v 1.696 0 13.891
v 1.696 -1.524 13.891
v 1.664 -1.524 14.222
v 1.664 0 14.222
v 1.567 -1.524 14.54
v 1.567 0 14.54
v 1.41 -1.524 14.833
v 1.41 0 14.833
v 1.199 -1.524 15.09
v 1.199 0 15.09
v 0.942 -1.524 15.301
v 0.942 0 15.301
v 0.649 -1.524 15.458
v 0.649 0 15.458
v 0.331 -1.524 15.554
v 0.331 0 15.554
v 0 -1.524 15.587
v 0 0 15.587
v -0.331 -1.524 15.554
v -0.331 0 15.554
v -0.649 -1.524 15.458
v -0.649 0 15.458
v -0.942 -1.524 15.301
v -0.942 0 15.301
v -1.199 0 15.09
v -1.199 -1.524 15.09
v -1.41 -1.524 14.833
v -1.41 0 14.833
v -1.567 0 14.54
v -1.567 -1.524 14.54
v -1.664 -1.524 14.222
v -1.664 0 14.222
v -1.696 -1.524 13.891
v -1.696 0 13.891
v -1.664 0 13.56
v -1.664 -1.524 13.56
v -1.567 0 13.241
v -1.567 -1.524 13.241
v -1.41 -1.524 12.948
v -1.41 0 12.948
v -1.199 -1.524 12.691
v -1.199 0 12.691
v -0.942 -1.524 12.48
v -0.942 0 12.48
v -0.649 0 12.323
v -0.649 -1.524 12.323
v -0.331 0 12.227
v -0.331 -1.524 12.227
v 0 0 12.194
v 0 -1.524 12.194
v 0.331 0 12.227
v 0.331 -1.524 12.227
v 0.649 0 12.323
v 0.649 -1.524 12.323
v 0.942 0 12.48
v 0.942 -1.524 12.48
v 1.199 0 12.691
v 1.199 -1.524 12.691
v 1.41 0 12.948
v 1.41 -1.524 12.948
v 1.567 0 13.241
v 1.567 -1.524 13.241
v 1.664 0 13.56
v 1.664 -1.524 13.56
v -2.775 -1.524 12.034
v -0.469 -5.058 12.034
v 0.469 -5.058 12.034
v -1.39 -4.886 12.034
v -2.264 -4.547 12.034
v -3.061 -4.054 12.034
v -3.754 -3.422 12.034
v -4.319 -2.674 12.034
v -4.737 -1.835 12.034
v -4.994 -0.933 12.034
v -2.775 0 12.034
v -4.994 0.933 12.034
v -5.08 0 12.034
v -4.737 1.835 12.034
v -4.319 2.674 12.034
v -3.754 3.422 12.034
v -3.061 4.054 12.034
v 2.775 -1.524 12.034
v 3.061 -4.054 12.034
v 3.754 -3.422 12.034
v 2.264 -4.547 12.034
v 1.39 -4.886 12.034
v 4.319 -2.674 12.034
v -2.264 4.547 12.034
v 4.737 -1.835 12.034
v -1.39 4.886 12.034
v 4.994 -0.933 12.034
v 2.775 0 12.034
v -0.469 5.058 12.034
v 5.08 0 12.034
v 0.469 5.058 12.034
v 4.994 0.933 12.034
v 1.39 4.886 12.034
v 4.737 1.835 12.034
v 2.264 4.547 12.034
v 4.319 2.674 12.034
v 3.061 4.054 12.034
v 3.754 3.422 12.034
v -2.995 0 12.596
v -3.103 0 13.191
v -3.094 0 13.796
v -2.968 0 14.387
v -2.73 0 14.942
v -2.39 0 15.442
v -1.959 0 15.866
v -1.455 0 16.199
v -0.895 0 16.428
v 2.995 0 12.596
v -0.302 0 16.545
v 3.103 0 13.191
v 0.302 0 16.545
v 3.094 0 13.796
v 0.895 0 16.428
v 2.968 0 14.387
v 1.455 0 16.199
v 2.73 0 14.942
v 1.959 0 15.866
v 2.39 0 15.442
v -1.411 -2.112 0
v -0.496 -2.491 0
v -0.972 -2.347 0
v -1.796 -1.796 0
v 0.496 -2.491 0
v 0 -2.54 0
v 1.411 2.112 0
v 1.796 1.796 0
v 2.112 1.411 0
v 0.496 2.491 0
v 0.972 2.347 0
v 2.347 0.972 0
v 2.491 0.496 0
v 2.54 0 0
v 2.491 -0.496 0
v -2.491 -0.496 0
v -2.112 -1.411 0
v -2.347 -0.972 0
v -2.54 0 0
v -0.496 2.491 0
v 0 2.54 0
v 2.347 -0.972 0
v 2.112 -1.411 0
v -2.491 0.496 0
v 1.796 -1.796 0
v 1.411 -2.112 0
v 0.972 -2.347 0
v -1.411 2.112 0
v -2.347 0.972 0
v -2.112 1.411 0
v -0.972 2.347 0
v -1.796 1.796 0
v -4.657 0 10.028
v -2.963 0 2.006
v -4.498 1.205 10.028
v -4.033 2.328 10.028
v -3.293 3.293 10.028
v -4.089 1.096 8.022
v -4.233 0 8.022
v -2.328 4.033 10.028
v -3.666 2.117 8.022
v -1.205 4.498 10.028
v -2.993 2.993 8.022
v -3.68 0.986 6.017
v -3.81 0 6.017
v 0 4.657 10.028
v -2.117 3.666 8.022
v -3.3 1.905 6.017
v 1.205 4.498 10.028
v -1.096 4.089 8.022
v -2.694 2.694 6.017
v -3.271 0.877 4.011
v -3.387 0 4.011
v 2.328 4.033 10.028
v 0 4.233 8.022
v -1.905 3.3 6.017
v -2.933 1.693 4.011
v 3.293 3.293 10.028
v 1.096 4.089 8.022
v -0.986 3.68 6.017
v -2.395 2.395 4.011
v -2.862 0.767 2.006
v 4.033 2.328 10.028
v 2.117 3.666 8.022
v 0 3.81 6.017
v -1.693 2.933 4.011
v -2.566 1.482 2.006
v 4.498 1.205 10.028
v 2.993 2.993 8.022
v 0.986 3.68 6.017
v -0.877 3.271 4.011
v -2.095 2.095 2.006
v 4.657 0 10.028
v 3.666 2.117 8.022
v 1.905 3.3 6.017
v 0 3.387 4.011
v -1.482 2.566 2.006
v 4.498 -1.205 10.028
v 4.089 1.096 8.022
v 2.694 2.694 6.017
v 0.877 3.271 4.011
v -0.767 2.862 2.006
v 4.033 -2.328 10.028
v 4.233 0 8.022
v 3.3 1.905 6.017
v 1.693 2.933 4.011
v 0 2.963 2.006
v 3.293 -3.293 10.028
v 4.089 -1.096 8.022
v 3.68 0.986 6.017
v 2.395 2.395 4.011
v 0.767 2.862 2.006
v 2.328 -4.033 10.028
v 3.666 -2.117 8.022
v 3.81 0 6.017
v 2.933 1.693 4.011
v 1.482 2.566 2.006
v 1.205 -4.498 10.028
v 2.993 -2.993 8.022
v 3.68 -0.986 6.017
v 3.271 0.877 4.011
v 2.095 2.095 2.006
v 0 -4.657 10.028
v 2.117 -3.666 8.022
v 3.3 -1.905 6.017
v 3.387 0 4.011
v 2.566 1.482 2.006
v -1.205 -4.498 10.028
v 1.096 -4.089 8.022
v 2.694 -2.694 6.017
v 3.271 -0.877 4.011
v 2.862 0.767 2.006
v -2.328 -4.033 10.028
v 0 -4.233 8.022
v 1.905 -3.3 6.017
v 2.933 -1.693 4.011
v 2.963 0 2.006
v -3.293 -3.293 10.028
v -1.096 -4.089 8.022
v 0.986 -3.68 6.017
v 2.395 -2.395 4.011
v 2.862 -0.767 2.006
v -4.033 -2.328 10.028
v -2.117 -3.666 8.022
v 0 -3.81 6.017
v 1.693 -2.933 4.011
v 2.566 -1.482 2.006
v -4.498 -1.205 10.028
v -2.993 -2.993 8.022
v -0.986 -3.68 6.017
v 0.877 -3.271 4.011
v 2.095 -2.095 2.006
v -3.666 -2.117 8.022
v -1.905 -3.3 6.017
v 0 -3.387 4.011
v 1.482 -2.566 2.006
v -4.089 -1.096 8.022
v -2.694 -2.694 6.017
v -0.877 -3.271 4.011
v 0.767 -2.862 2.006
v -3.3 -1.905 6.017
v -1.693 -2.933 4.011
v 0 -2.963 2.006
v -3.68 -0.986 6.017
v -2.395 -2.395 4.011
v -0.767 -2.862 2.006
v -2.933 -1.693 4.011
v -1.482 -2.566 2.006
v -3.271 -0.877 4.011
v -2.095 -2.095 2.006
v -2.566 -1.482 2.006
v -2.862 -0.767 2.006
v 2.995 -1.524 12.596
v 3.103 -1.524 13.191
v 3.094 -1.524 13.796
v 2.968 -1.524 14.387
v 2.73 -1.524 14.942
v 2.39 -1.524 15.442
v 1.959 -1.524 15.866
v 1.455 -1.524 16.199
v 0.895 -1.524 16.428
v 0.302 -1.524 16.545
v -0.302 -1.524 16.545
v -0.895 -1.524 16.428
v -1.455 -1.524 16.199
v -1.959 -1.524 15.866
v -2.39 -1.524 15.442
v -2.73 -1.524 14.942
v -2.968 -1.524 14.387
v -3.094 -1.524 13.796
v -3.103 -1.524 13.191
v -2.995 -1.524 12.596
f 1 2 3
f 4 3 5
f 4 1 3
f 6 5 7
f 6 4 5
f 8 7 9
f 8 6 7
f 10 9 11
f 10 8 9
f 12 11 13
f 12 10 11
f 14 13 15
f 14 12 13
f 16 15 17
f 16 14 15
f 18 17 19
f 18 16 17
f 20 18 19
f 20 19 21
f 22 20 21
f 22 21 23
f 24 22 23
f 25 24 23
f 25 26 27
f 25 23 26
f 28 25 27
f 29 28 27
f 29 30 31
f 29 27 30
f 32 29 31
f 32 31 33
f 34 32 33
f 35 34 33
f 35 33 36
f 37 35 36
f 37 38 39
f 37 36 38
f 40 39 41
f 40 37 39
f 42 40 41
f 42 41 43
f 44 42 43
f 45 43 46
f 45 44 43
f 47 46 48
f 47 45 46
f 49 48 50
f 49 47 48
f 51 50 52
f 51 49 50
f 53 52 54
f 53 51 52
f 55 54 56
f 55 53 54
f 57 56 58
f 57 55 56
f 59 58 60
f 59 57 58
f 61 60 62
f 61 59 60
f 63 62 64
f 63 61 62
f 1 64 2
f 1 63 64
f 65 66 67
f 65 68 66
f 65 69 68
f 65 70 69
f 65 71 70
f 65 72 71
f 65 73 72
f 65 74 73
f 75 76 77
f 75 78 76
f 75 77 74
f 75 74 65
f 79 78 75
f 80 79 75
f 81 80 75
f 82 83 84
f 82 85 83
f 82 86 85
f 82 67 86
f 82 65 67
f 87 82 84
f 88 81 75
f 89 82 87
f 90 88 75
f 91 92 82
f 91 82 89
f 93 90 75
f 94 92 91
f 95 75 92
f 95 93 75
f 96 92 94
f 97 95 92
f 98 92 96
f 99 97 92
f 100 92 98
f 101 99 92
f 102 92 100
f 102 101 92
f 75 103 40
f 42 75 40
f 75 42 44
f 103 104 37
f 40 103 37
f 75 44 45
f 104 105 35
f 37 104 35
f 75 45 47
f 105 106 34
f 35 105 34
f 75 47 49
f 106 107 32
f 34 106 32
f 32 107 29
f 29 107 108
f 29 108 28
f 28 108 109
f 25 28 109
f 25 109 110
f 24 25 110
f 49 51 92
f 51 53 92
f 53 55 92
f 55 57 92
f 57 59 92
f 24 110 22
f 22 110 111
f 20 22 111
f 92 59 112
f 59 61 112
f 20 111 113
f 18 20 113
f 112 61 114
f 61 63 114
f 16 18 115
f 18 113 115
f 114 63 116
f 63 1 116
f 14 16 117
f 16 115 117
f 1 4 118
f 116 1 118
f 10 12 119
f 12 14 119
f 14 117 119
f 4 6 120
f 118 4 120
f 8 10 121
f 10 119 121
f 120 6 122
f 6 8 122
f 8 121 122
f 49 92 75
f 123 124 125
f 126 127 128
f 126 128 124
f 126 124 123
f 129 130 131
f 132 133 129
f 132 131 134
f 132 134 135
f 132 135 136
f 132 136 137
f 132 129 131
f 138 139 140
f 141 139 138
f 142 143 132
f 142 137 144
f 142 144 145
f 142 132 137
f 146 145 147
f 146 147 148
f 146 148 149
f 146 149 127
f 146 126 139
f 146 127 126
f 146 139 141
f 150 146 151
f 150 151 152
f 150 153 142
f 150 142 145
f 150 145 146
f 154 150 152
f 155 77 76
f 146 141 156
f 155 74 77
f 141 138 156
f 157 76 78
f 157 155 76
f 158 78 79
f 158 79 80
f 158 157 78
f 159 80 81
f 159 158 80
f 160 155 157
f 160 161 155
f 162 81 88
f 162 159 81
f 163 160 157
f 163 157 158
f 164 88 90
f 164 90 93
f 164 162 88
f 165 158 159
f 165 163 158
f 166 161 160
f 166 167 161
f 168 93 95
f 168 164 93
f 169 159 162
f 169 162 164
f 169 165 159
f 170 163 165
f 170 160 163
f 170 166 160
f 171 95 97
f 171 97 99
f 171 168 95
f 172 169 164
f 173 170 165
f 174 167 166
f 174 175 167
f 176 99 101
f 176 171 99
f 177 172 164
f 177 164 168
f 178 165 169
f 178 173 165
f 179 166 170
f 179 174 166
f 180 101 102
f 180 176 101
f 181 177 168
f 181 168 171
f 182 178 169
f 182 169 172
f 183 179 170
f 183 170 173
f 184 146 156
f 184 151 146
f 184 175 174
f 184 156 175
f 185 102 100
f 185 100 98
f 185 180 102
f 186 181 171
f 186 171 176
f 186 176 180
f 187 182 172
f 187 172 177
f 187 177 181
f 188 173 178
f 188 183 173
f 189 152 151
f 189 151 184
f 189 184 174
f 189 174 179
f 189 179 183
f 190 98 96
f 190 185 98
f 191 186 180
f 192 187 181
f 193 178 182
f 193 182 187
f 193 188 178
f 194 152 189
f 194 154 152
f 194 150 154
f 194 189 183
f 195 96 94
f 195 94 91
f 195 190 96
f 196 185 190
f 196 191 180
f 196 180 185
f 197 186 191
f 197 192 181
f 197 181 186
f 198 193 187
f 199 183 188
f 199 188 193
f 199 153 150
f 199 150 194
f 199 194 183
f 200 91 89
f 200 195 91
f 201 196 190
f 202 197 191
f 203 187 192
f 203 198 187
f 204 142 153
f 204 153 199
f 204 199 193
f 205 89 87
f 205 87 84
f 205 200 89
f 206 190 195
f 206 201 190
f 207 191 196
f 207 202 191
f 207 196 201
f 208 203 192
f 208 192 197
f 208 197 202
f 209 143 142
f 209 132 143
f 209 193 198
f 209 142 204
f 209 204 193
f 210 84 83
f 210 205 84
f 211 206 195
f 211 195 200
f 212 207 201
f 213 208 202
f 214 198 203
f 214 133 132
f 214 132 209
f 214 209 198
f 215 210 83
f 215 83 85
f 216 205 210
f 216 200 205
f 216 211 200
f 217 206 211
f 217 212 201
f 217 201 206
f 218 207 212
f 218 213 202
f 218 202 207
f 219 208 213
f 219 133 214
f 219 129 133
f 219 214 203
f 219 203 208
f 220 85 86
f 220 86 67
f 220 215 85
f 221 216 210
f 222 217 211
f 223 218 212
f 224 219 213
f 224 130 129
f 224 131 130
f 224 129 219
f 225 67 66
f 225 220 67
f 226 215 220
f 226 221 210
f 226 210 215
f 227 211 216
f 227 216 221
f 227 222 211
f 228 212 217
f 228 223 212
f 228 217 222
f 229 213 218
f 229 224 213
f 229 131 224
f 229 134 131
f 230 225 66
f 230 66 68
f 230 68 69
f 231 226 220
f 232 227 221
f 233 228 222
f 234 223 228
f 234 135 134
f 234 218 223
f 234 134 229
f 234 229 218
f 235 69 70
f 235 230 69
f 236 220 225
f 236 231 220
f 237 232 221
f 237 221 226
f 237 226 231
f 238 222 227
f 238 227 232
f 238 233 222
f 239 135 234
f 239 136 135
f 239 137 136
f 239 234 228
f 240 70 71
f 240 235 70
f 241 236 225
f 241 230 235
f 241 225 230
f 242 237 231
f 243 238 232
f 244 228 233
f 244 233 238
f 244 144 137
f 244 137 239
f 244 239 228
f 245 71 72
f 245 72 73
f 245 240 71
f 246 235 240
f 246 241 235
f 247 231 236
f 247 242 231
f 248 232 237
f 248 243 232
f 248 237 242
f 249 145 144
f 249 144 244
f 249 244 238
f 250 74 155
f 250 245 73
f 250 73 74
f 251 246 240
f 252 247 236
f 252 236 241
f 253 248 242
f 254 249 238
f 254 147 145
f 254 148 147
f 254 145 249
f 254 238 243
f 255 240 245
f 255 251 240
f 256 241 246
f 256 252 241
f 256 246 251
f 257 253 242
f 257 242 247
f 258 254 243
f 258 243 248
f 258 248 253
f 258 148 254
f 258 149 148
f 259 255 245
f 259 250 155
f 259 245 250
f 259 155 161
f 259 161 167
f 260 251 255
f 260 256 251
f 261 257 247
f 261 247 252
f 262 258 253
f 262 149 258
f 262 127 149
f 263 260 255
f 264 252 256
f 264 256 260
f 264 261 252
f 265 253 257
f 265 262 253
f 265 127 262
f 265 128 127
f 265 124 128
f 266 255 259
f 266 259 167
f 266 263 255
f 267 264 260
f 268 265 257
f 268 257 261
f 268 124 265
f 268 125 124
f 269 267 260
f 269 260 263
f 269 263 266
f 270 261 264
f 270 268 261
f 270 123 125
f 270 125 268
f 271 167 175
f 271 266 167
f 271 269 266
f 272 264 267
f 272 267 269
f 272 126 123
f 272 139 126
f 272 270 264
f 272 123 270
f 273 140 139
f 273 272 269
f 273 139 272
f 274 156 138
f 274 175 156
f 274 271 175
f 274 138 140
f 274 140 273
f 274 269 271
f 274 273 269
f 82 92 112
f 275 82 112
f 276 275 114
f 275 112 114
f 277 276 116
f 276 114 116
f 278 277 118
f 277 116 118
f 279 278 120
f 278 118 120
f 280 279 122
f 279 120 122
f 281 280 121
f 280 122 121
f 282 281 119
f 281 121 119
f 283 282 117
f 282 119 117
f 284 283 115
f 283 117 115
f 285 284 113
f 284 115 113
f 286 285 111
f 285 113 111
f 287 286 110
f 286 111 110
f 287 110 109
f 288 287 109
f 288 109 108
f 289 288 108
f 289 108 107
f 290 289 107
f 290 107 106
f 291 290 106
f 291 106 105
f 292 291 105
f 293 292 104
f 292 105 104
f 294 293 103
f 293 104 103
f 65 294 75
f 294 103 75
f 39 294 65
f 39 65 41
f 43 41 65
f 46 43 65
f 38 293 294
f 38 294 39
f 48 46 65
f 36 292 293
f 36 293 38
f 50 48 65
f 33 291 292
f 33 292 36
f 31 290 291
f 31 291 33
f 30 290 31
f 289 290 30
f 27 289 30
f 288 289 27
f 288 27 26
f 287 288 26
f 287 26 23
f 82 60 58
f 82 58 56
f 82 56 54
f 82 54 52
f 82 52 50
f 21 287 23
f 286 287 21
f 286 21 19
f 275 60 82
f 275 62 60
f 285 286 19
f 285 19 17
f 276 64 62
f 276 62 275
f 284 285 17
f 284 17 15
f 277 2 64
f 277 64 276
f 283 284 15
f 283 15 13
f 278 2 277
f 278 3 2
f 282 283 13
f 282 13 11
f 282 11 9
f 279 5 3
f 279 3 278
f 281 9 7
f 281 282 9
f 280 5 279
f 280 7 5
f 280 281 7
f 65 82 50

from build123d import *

# Parameters (mm, degrees)
F2_R     = 0.057539
F3_DEPTH = 12.7
F4_R     = 3.113486
F5_DEPTH = 1.524
F6_R     = 1.696249
F7_DEPTH = 27.432


with BuildPart() as f1:
    # F0 (on Front) → F1 (revolve)
    with BuildSketch(Plane.XZ):
        Polygon((-2.54, 0), (0, 0), (0, 12.033645), (-5.08, 12.033645), align=None)
    revolve(axis=Axis((0, 0, 6.016822), (0, 0, -1)))

    # F2 (on Right) → F3 (cut, symmetric)
    with BuildSketch(Plane.YZ):
        with Locations((0, 19.658387)):
            Circle(F2_R)
    extrude(amount=F3_DEPTH, both=True, mode=Mode.SUBTRACT)

    # F4 (on Front) → F5 (join)
    with BuildSketch(Plane.XZ):
        with Locations((0, 13.446124)):
            Circle(F4_R)
    extrude(amount=F5_DEPTH)

    # F6 (on Front) → F7 (cut)
    with BuildSketch(Plane.XZ):
        with Locations((0, 13.890625)):
            Circle(F6_R)
    extrude(amount=F7_DEPTH, mode=Mode.SUBTRACT)


solid = f1.part
